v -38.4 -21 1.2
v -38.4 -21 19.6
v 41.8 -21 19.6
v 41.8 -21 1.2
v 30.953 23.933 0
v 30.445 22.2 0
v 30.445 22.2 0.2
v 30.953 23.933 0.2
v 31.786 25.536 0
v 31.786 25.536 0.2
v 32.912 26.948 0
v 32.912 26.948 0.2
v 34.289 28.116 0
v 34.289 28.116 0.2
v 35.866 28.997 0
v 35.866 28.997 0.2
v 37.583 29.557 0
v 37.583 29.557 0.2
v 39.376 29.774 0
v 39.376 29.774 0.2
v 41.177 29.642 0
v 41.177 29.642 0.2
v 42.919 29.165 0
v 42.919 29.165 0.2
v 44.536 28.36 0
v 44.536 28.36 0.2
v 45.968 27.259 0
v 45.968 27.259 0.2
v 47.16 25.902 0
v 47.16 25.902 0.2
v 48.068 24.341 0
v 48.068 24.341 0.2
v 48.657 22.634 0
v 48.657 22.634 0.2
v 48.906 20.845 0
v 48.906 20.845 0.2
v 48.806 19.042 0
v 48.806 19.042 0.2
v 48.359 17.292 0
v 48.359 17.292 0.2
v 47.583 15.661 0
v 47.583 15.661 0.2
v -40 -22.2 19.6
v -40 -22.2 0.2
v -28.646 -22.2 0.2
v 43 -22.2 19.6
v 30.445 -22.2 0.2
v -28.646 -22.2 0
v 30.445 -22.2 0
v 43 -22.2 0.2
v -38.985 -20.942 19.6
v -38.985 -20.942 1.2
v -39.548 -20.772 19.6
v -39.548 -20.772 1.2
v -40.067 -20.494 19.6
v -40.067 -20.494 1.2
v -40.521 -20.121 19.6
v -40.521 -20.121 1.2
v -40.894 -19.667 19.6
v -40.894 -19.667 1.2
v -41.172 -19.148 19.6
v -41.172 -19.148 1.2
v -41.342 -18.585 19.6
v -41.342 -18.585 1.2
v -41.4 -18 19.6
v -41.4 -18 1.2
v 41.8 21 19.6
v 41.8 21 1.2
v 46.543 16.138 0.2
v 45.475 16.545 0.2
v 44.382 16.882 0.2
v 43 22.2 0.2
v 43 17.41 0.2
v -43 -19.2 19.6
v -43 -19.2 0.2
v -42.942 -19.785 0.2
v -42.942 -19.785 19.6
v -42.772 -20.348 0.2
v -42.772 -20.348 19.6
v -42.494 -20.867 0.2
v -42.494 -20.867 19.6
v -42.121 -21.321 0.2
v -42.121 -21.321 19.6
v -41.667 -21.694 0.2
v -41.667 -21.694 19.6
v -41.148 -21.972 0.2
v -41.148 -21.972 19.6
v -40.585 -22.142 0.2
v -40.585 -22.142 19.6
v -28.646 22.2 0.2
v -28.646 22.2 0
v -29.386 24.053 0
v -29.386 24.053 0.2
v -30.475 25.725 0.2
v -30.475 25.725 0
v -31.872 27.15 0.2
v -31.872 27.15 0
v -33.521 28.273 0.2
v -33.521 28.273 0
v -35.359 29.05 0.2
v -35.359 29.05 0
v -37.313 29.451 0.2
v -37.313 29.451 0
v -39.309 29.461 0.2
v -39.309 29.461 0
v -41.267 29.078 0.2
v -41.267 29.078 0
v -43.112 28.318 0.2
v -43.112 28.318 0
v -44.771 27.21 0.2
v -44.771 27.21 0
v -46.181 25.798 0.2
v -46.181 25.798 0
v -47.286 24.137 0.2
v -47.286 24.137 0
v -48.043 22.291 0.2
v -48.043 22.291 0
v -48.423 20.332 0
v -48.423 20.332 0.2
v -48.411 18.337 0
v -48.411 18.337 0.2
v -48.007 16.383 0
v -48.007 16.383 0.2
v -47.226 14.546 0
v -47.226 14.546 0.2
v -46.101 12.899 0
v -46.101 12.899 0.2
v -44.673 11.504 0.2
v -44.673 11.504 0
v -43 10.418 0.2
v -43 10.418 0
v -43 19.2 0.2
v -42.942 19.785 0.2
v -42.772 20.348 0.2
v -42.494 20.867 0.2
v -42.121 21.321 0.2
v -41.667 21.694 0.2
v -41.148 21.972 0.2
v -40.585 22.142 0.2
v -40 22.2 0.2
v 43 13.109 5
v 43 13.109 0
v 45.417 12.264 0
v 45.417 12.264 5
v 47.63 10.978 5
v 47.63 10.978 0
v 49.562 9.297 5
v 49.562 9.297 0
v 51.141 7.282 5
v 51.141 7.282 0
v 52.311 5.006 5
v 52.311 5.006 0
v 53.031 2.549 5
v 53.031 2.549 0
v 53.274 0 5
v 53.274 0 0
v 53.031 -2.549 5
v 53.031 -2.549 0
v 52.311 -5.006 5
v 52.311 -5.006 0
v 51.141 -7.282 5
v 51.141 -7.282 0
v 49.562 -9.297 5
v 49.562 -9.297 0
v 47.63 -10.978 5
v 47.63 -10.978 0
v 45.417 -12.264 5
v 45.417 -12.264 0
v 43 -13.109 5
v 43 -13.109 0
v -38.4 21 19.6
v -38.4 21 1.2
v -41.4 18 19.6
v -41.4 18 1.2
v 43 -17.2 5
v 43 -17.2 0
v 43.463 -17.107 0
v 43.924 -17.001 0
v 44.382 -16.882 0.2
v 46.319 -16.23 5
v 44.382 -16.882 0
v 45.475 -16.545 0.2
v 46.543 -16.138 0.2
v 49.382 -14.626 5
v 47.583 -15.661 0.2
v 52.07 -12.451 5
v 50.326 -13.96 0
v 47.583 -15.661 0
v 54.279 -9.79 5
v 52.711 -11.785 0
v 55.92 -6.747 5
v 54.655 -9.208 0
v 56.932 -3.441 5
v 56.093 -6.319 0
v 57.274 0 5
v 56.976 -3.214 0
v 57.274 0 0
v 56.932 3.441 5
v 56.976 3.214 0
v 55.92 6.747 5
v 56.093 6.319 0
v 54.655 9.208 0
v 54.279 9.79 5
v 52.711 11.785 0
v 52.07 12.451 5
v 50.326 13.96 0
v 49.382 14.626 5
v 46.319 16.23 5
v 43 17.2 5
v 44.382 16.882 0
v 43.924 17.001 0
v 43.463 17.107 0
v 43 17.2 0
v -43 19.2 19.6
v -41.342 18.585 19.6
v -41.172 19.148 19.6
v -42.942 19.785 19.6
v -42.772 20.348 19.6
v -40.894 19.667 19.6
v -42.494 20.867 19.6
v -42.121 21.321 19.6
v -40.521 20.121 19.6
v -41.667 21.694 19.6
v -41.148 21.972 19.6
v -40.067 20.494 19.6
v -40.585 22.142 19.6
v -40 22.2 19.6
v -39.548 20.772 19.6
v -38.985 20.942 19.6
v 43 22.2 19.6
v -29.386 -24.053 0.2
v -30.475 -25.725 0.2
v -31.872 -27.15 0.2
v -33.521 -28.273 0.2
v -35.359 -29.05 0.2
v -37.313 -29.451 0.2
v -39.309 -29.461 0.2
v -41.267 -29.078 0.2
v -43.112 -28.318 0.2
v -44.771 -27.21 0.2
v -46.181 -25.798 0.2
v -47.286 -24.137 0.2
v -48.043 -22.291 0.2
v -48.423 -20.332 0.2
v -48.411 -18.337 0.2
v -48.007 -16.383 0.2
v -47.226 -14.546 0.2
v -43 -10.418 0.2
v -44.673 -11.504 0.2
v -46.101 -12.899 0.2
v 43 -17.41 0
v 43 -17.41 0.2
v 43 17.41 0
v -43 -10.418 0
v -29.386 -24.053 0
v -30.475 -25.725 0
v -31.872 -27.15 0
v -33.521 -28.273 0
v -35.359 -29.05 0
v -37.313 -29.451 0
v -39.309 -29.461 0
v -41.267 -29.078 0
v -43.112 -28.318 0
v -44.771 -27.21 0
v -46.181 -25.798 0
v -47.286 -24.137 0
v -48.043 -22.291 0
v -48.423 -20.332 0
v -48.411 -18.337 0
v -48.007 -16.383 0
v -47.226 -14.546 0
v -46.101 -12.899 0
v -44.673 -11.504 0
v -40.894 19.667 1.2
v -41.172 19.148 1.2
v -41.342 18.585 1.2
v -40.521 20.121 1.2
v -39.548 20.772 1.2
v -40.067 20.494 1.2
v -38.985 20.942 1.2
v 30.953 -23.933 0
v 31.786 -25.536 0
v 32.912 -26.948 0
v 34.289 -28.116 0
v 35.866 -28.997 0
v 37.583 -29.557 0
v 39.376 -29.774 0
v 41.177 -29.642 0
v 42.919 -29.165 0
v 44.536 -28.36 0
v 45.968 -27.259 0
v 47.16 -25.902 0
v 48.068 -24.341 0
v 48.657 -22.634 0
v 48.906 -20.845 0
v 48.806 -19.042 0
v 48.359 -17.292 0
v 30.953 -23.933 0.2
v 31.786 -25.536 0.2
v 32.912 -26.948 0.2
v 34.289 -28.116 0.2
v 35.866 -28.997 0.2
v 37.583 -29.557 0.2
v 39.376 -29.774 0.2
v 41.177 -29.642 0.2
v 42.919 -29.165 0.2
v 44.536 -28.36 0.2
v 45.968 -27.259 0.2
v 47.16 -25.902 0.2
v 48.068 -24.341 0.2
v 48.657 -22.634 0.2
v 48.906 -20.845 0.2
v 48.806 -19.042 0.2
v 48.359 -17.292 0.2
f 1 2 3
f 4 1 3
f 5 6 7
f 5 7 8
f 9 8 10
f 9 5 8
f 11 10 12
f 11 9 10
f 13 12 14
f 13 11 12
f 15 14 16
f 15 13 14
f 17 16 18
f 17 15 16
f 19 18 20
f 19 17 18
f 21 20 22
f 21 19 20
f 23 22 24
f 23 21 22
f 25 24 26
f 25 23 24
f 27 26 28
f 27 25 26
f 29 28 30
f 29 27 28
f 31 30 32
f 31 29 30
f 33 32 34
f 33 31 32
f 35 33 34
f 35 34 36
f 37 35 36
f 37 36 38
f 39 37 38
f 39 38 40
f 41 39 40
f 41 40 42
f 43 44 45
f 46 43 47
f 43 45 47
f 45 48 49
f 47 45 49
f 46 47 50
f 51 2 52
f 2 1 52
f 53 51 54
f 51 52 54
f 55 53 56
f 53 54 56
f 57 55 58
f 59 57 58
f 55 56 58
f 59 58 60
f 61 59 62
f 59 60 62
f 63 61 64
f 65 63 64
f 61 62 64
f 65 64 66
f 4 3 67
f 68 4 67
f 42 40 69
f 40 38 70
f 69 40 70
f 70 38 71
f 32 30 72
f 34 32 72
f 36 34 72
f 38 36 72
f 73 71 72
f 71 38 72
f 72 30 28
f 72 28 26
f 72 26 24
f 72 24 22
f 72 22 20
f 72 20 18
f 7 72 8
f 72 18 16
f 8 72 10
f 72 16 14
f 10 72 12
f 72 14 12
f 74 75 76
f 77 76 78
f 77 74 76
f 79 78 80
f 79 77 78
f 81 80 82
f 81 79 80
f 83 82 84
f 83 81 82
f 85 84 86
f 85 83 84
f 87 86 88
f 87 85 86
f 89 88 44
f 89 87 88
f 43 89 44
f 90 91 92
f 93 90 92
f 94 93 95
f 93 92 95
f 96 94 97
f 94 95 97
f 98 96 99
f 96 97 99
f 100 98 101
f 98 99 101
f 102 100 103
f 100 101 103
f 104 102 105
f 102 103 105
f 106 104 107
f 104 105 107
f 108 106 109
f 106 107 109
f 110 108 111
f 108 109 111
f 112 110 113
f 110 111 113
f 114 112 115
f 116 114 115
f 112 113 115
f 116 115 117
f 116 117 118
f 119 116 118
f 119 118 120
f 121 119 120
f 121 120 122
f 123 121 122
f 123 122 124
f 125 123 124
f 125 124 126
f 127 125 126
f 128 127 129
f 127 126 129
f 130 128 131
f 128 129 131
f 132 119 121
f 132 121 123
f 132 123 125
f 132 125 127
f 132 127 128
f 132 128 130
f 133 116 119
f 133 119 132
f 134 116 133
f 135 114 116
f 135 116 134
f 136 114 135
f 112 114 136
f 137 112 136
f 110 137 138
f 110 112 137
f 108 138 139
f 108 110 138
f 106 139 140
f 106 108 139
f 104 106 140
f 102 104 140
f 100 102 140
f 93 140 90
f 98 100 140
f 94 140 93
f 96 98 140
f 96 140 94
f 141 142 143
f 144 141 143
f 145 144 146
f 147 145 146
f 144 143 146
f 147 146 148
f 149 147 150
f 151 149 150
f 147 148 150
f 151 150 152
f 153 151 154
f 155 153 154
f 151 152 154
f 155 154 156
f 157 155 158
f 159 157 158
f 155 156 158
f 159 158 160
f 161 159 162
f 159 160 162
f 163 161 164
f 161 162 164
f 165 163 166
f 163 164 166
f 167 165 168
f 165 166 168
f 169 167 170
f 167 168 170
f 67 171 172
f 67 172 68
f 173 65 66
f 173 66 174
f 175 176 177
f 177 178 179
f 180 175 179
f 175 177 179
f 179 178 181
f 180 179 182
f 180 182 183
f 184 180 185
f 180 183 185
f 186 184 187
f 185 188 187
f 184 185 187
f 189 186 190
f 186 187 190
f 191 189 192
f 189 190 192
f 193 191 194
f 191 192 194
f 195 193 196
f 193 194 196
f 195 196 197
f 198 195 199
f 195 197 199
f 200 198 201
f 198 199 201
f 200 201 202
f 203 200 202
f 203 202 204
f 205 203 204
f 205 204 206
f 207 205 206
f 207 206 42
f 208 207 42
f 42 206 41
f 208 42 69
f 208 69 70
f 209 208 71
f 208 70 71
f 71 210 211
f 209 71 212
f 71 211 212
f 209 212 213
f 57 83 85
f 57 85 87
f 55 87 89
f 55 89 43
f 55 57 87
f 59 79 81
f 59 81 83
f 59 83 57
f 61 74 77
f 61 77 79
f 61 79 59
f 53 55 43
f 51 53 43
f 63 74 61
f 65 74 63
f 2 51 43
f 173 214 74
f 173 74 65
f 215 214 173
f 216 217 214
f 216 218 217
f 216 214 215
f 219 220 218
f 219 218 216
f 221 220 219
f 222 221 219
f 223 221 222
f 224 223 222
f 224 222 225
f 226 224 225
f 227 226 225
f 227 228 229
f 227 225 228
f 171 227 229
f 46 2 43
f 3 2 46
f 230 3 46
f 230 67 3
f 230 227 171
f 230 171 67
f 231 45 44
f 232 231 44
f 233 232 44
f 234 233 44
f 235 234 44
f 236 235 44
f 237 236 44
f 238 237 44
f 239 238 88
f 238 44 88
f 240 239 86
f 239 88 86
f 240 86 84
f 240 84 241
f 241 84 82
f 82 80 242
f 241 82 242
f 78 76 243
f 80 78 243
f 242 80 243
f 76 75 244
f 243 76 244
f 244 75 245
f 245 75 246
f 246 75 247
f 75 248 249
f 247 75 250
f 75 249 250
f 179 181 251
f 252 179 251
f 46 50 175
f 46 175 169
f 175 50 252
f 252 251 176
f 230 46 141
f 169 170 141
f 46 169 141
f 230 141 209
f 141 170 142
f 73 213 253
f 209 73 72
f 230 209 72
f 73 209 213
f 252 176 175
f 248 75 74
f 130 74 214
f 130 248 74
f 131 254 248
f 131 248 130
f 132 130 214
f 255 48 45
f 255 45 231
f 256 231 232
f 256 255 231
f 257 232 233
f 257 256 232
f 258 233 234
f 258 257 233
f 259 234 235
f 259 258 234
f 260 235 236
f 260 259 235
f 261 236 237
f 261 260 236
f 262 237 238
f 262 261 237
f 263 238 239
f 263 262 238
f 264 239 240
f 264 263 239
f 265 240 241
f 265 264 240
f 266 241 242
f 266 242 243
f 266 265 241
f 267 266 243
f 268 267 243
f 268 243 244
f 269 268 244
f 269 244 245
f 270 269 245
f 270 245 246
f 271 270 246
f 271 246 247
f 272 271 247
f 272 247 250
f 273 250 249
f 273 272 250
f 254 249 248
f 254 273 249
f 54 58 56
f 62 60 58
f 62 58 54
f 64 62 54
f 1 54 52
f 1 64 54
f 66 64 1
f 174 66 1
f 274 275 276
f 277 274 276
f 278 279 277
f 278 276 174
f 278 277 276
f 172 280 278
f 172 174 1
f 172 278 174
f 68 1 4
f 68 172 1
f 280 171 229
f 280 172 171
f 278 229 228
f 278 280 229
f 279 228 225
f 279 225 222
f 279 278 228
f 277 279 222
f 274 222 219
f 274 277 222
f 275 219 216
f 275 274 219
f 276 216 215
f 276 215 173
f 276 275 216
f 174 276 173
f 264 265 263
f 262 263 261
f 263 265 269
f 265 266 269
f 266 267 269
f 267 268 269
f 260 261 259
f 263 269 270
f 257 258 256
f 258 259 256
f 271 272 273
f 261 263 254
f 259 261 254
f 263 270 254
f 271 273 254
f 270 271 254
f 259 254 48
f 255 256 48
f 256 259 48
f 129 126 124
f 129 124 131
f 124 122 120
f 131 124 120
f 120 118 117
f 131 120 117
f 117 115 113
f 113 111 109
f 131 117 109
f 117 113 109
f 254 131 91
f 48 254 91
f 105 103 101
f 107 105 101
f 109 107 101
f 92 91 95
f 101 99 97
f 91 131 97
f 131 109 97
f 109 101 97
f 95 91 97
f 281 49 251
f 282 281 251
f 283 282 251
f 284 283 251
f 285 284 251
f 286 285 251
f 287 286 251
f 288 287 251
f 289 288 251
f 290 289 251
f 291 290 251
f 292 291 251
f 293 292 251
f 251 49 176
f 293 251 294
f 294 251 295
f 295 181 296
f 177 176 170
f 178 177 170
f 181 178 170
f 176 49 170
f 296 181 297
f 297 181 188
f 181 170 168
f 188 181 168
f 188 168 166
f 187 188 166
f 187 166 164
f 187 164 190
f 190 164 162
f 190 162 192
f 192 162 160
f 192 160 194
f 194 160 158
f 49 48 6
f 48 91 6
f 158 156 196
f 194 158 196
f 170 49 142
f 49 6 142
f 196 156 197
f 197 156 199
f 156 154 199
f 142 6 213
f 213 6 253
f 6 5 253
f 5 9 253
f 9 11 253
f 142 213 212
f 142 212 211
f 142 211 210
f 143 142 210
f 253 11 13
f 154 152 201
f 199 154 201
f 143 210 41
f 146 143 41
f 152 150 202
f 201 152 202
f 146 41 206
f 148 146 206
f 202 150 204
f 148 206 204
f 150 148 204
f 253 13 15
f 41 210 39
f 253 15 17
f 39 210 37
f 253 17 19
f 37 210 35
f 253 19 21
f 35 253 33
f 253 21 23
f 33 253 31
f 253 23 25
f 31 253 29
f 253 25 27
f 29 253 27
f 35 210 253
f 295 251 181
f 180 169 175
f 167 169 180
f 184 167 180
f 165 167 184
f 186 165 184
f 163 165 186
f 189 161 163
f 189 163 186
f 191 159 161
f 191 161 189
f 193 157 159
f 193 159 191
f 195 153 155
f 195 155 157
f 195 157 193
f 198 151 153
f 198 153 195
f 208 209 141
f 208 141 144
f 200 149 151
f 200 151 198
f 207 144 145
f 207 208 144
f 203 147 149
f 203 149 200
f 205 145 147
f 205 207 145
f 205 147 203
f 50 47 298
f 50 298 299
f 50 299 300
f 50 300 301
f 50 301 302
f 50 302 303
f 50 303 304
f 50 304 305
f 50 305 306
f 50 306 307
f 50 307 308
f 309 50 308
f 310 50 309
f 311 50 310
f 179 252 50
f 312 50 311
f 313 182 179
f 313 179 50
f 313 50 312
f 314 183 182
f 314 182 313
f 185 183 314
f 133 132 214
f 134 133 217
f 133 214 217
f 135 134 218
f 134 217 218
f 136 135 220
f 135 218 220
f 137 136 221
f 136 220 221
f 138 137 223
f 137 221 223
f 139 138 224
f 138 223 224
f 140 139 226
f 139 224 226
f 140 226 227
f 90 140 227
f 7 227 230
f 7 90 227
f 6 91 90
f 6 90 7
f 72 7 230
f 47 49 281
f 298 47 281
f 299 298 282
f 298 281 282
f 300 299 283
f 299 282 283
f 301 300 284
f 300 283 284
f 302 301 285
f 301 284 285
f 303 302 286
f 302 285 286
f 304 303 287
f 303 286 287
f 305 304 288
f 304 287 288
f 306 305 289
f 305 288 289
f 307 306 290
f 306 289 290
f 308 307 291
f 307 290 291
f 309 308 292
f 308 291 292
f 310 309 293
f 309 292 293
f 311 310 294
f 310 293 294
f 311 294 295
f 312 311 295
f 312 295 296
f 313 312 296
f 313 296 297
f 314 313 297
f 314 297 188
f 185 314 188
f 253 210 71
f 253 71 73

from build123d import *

# Parameters (mm, degrees)
SKETCH_1_W          = 86
SKETCH_1_H          = 44.4
EXTRUDE_1_DEPTH     = 19.6
EXTRUDE_2_DEPTH     = 5
SKETCH_3_W          = 83.2
SKETCH_3_H          = 42
CUT_EXTRUDE_1_DEPTH = 18.4
FILLET_1_R          = 3
EXTRUDE_3_DEPTH     = 0.2


with BuildPart() as part:
    # Эскиз1 → Бобышка-Вытянуть1 (new body)
    with BuildSketch(Plane.XY):
        Rectangle(SKETCH_1_W, SKETCH_1_H)
    extrude(amount=EXTRUDE_1_DEPTH)

    # Эскиз2 → Бобышка-Вытянуть2 (add)
    with BuildSketch(Plane.XY):
        with BuildLine():
            Line((43, 17.2), (43, 13.108775687))
            ThreePointArc((43, 13.108775687), (53.273546839, 0), (43, -13.108775687))
            Line((43, -13.108775687), (43, -17.2))
            ThreePointArc((43, -17.2), (57.273546839, 0), (43, 17.2))
        make_face()
    extrude(amount=EXTRUDE_2_DEPTH)

    # Эскиз3 → Вырез-Вытянуть1 (cut)
    with BuildSketch(Plane.XY.offset(19.6)):
        with Locations((0.2, 0)):
            Rectangle(SKETCH_3_W, SKETCH_3_H)
    extrude(amount=-CUT_EXTRUDE_1_DEPTH, mode=Mode.SUBTRACT)

    # Скругление1
    fillet_1_edges = [part.edges().sort_by_distance(p)[0] for p in [
        (-41.4, -21, 10.4),
        (-41.4, 21, 10.4),
        (-43, -22.2, 9.8),
        (-43, 22.2, 9.8),
    ]]
    fillet(fillet_1_edges, radius=FILLET_1_R)

    # Эскиз4 → Бобышка-Вытянуть3 (add)
    with BuildSketch(Plane(origin=(0, 0, 0), x_dir=(-1, 0, 0), z_dir=(0, 0, -1))):
        with BuildLine():
            Line((-47.582884167, 15.66091474), (-30.44547065, 22.2))
            ThreePointArc((-30.44547065, 22.2), (-42.919306358, 29.16488726), (-47.582884167, 15.66091474))
        make_face()
        with BuildLine():
            Line((-47.582884167, -15.66091474), (-30.44547065, -22.2))
            ThreePointArc((-30.44547065, -22.2), (-42.919306358, -29.16488726), (-47.582884167, -15.66091474))
        make_face()
        with BuildLine():
            Line((43, 10.417706136), (28.64602487, 22.2))
            ThreePointArc((28.64602487, 22.2), (44.771493482, 27.210488681), (43, 10.417706136))
        make_face()
        with BuildLine():
            Line((43, -10.417706136), (28.64602487, -22.2))
            ThreePointArc((28.64602487, -22.2), (44.771493482, -27.210488681), (43, -10.417706136))
        make_face()
    extrude(amount=-EXTRUDE_3_DEPTH)


solid = part.part
